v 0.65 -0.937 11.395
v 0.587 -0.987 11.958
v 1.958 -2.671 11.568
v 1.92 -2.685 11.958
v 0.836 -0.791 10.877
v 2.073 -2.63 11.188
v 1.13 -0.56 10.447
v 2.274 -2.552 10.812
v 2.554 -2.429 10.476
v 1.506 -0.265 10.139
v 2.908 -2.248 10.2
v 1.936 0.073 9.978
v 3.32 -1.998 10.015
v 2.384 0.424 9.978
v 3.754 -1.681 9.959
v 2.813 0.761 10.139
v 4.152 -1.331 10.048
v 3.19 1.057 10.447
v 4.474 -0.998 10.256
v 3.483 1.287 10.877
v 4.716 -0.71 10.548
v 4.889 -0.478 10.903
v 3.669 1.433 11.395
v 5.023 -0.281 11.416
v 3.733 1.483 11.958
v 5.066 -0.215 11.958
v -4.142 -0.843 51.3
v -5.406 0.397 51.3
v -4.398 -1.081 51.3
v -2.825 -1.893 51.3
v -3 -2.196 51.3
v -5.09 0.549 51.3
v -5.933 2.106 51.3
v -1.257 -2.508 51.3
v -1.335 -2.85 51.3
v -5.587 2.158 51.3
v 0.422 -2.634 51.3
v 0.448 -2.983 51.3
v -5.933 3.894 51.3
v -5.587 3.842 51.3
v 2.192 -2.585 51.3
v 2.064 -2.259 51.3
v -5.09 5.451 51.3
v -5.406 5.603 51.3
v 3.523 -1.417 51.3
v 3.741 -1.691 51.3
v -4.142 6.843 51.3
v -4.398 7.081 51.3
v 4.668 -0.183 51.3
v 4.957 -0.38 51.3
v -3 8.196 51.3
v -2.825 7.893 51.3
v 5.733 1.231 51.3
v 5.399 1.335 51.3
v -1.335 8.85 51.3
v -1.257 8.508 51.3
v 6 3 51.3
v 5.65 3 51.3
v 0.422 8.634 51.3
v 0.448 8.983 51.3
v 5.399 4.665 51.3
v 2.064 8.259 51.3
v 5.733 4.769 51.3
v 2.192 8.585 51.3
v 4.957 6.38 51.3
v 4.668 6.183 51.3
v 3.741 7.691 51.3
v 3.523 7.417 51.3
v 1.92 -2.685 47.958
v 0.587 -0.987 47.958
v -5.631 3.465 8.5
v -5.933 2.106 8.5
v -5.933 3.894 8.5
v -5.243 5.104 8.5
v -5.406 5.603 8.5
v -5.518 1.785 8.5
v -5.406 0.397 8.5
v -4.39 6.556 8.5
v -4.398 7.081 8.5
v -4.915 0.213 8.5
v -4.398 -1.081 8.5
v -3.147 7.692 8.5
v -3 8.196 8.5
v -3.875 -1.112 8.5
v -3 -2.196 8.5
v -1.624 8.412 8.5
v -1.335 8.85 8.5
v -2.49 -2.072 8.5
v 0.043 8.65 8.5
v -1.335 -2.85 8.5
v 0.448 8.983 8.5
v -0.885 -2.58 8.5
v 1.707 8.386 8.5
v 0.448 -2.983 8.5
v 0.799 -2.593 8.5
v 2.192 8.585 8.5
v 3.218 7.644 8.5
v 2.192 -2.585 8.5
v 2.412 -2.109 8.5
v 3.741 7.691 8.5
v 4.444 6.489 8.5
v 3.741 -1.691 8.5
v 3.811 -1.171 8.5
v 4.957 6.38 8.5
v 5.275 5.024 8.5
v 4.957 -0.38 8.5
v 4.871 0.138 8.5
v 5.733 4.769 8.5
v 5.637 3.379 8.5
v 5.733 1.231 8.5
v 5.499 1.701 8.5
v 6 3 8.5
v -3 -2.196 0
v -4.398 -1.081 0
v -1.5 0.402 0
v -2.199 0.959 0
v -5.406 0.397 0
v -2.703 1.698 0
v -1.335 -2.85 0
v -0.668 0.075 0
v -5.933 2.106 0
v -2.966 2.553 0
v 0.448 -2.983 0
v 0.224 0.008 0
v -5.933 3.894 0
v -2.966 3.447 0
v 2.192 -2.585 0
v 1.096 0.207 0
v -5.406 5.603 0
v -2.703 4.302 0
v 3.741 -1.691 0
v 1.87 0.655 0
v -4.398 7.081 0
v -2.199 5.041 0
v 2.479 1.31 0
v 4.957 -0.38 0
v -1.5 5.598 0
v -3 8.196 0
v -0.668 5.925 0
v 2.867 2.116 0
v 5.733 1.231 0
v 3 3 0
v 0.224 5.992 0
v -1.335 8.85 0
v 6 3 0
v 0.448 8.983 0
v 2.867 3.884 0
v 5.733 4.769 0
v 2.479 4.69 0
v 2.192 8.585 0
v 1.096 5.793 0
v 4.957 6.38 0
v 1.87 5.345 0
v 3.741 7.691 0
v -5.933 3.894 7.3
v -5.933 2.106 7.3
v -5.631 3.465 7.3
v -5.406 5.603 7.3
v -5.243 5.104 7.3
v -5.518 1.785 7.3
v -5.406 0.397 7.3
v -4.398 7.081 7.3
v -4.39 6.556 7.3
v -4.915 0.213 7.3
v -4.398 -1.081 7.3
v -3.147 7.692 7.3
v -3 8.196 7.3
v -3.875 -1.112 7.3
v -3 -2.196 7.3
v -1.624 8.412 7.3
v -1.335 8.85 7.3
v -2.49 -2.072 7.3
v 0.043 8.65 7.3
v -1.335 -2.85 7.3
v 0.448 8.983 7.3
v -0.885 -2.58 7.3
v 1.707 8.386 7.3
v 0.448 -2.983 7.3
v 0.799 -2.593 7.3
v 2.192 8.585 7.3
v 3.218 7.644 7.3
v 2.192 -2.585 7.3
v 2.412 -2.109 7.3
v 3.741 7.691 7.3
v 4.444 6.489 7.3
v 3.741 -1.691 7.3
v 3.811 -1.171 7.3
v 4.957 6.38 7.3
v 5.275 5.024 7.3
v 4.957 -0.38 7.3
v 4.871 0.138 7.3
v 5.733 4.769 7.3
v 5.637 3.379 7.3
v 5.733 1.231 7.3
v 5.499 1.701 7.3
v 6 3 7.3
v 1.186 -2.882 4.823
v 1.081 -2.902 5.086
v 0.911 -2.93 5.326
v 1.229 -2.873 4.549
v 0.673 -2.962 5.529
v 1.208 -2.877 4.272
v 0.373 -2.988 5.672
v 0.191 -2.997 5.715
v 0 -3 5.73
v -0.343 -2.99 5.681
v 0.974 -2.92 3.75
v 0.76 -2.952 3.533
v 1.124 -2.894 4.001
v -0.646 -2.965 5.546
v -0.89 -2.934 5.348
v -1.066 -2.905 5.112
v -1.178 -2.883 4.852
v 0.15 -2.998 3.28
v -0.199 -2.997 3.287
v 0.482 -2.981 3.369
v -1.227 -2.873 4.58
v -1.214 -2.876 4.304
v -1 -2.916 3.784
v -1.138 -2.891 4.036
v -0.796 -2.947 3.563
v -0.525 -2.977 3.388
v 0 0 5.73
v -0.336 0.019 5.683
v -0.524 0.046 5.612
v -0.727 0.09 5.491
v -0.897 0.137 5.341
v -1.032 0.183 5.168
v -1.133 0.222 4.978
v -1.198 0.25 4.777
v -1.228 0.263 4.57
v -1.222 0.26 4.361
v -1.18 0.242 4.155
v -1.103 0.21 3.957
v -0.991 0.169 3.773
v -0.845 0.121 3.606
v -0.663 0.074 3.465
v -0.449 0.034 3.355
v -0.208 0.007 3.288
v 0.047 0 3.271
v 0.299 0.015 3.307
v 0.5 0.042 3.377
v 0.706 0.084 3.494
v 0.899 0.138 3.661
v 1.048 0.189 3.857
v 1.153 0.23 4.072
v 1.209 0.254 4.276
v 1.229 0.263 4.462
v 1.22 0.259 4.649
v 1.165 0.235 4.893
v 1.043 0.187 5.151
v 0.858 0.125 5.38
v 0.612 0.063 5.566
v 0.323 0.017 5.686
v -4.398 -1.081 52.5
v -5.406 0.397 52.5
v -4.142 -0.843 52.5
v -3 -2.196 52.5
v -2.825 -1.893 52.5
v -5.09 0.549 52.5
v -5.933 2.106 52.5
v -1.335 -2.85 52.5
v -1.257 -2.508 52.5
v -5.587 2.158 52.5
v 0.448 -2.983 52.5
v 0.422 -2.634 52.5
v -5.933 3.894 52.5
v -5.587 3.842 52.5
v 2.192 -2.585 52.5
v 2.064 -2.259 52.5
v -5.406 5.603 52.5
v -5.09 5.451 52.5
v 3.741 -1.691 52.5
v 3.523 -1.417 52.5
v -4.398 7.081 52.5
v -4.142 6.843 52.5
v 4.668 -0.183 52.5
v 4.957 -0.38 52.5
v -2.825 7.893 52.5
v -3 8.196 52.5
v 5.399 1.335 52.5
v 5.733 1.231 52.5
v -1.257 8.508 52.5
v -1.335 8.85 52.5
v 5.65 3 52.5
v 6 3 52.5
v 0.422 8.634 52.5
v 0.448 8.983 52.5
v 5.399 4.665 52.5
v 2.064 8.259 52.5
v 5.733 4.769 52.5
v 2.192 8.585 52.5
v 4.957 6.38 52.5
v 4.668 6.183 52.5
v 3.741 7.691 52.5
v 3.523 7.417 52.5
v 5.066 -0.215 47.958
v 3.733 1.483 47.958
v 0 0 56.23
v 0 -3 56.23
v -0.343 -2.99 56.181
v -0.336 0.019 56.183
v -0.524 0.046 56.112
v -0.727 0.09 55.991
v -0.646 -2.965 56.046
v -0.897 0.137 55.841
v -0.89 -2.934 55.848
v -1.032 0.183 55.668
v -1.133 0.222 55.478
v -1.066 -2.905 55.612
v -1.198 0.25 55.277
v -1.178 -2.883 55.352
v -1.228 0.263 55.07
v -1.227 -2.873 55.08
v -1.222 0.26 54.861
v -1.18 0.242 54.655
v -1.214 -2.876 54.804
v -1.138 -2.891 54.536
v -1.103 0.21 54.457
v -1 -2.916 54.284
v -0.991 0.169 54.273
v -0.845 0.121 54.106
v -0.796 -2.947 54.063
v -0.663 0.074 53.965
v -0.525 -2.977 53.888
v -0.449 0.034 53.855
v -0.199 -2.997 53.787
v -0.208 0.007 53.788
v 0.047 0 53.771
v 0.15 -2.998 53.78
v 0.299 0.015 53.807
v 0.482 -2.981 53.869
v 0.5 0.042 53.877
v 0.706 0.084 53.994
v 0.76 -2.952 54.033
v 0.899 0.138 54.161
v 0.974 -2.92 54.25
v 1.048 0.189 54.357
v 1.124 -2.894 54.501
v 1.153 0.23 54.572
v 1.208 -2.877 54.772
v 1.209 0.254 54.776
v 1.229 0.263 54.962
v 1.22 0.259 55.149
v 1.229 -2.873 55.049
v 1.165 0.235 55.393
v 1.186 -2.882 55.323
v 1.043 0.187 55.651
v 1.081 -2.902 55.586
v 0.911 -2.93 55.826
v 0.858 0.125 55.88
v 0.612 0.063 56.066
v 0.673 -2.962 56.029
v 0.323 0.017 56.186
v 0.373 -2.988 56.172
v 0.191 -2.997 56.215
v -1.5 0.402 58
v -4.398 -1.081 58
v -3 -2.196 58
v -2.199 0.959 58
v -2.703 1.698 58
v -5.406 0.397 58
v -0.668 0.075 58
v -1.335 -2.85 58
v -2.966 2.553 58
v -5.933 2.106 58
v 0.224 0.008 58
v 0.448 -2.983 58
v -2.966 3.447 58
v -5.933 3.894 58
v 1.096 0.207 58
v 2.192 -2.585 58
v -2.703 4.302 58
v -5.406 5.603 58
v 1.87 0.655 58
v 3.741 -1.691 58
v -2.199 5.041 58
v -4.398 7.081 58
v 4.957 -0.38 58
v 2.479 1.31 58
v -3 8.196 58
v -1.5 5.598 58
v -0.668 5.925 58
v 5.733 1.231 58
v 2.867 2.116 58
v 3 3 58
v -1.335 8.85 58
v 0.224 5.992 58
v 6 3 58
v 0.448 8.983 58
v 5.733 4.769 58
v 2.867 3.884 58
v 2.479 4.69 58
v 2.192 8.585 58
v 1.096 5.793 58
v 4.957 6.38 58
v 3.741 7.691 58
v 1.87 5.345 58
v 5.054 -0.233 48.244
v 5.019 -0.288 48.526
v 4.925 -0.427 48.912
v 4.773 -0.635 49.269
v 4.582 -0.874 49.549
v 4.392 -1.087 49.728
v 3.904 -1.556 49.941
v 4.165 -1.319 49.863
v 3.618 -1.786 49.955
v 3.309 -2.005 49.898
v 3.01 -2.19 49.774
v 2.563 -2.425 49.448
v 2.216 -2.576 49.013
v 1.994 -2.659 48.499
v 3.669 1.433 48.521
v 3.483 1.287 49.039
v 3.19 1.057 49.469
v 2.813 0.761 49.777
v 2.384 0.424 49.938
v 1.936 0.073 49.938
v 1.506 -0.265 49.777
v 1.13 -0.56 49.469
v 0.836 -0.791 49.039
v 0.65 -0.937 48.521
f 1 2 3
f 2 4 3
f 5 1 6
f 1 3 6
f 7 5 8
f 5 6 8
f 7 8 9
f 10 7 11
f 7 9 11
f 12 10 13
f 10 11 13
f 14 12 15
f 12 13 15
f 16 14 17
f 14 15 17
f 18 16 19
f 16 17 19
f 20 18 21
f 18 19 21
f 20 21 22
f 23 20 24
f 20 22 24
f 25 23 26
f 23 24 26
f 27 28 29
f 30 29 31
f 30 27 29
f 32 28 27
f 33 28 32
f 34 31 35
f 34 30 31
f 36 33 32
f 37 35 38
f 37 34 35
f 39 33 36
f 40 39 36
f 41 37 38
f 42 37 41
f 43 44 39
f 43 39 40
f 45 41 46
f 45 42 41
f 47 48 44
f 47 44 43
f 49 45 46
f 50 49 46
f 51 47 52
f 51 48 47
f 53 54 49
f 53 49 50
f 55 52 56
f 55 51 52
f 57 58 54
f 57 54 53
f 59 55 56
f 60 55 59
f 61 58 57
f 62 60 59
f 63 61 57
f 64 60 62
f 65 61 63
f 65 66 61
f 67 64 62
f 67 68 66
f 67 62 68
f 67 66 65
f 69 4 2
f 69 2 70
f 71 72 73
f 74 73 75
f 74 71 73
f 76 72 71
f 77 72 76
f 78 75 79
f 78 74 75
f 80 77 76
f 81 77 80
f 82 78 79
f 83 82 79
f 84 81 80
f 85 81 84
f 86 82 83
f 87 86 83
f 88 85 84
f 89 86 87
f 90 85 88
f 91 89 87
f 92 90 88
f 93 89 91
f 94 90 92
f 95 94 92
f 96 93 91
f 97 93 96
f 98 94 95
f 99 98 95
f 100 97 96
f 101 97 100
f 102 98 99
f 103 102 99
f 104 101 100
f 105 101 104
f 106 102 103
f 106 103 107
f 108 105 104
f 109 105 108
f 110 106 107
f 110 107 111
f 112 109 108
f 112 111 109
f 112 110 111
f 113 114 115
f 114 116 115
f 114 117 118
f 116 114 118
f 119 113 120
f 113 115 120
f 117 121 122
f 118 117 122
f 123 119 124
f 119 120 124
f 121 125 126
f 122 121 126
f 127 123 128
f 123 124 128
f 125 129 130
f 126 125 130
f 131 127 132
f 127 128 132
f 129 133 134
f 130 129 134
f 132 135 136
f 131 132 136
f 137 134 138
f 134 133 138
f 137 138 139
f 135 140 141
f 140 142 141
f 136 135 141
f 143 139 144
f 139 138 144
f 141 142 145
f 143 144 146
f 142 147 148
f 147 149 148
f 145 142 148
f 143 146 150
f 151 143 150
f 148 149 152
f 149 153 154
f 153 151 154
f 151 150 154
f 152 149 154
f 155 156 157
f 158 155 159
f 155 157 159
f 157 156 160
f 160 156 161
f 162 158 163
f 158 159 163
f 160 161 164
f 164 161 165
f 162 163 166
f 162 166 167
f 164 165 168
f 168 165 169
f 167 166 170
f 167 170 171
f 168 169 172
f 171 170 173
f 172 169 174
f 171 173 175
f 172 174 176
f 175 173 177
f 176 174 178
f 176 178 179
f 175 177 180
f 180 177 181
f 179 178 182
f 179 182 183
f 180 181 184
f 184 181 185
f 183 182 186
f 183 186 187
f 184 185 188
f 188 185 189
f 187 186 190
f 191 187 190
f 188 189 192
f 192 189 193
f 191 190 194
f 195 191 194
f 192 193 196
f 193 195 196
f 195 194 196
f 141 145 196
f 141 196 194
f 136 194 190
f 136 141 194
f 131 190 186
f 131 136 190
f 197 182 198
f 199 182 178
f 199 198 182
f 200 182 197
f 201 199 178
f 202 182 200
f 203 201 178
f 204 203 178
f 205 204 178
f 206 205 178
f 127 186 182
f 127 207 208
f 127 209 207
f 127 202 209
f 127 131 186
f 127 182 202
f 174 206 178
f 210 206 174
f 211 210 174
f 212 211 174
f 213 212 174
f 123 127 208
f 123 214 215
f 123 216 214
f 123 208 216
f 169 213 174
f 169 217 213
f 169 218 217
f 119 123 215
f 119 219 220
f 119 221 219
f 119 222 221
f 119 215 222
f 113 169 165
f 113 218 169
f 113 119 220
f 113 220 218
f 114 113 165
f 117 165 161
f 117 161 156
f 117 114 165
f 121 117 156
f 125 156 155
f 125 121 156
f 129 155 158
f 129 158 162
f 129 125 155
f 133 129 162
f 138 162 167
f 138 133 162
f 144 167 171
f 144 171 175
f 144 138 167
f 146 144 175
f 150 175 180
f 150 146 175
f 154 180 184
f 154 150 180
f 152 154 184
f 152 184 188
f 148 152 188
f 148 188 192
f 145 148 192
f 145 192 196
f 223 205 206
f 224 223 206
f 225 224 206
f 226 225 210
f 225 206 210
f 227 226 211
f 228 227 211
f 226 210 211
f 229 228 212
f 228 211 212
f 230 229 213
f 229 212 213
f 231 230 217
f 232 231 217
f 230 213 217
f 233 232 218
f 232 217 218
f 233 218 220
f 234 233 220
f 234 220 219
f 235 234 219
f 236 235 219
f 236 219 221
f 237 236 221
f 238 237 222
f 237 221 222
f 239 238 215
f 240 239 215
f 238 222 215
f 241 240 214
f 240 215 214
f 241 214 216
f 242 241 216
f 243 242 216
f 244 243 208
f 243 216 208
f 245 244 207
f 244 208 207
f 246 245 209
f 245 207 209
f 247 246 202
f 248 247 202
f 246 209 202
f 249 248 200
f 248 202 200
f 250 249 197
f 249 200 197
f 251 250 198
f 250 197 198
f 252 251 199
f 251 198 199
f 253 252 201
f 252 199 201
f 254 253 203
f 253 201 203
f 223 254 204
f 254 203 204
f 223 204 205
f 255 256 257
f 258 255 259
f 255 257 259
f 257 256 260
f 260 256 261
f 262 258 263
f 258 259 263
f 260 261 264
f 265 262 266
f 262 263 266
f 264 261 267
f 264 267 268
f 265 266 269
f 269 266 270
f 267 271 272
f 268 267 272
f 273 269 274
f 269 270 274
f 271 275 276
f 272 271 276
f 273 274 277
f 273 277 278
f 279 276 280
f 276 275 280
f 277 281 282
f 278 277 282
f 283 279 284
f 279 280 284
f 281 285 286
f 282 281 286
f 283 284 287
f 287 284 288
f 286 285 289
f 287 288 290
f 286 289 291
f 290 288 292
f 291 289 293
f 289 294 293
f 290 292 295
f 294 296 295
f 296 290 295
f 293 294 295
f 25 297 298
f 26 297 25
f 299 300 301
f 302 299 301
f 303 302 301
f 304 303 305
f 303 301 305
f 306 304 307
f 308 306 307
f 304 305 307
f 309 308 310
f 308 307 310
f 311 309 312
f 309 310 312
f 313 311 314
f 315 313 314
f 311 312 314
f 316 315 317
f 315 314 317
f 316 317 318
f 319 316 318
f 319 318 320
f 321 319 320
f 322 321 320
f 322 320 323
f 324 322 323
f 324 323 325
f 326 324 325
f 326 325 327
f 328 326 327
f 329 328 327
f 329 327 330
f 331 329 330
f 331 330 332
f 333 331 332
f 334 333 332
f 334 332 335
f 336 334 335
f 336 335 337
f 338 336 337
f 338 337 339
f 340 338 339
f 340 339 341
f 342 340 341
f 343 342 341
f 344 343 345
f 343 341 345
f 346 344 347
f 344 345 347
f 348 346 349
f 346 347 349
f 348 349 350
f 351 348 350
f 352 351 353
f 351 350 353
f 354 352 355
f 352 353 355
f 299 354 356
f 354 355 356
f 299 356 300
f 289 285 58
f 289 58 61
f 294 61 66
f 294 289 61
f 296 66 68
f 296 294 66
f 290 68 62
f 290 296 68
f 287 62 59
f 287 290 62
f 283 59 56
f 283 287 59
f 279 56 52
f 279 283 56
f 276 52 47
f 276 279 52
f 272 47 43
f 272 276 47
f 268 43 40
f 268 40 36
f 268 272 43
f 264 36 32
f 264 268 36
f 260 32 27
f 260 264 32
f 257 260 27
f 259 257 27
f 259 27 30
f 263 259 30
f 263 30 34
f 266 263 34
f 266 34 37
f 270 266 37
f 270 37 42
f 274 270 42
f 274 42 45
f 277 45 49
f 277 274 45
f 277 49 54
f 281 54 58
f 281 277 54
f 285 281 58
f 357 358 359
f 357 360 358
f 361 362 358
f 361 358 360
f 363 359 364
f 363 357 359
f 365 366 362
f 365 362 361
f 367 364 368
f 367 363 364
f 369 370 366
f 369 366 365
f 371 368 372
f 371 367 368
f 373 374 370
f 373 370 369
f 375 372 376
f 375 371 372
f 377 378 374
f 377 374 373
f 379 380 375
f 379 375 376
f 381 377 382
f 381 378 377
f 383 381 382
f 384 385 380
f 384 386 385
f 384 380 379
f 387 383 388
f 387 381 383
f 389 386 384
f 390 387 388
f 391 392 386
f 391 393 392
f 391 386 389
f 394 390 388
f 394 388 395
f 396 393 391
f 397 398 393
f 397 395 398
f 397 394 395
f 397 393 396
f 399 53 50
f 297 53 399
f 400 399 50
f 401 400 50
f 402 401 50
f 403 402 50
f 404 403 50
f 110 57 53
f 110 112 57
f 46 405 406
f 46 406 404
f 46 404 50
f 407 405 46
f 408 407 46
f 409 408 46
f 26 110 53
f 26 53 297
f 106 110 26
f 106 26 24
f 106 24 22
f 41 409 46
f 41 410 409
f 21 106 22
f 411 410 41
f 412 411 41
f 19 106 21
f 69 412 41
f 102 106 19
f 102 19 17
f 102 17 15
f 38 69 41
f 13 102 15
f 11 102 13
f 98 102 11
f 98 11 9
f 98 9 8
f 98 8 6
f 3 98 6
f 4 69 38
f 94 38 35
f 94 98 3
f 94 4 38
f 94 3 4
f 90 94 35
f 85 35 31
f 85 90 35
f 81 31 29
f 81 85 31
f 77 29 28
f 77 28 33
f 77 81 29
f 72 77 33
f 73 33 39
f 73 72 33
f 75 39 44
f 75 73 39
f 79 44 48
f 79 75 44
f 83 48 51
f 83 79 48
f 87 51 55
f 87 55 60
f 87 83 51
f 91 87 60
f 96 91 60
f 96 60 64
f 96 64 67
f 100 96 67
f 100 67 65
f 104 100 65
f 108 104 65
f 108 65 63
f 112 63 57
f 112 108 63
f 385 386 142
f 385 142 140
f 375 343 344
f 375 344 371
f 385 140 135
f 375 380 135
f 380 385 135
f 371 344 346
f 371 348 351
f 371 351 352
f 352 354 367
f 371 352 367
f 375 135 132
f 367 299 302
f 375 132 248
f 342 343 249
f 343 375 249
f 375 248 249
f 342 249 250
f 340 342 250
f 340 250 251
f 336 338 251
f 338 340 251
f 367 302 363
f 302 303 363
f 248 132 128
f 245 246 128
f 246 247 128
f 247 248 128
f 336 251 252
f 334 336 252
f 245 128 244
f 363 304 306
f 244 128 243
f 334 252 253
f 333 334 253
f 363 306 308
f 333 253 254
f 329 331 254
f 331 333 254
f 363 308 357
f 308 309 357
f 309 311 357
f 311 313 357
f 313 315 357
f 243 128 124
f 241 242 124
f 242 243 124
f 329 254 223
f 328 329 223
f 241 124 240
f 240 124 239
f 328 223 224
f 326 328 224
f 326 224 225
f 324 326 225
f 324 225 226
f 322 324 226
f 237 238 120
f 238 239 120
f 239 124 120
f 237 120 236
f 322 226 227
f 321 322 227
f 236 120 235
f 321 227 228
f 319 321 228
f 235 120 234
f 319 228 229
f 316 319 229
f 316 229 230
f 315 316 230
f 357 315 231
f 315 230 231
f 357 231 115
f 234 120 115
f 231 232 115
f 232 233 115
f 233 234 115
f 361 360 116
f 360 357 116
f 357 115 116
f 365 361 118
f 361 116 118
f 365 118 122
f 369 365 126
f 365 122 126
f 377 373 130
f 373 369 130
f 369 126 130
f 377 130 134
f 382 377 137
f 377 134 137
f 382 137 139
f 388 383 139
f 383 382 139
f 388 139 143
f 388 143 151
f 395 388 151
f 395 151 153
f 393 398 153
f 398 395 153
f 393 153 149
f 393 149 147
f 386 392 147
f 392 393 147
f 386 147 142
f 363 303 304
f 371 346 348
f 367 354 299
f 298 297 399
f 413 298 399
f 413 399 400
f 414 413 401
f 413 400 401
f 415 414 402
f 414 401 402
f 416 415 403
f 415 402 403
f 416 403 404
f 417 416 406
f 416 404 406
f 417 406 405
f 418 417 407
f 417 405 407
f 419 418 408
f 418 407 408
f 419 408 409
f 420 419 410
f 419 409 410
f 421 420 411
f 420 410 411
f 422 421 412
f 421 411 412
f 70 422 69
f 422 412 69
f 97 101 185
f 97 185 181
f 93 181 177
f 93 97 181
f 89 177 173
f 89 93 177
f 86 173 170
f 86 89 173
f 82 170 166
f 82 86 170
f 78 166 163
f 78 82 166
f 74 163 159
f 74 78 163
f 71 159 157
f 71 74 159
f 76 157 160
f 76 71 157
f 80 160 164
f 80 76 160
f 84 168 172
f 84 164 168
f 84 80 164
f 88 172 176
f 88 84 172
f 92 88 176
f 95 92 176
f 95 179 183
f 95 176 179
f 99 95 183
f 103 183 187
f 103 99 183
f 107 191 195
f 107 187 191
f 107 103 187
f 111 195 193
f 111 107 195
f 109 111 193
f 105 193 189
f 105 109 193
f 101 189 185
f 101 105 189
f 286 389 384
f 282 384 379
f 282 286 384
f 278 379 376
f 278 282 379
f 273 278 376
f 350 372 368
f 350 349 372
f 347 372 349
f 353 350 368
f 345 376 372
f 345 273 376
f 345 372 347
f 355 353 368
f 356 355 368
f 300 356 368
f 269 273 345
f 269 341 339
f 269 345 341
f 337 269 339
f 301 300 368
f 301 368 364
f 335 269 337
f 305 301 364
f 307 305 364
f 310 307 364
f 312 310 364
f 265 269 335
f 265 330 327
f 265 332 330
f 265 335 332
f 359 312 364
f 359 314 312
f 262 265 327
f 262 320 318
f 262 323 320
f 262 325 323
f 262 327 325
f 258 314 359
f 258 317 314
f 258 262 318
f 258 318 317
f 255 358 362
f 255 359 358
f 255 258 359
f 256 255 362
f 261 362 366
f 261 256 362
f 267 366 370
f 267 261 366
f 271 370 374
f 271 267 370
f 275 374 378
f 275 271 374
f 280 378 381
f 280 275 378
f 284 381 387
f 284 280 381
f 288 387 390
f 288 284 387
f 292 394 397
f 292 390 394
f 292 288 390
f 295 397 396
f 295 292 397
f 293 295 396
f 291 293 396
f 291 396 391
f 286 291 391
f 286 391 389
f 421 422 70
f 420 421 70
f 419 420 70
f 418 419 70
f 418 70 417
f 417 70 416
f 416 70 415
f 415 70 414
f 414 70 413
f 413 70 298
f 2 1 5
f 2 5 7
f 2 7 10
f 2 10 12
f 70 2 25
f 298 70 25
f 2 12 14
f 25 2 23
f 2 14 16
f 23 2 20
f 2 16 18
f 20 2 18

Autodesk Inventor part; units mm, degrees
ref_plane "YZ Plane" through (0, 0, 0) normal (1, 0, 0) x (0, 1, 0)
ref_plane "XY Plane" through (0, 0, 0) normal (0, 0, 1) x (1, 0, 0)
sketch "Эскиз1" plane through (0, 0, 0) normal (0, 0, 1) x (1, 0, 0)
  circle A0 centre (0, 3) radius 3 projected
  circle A1 centre (0, 3) radius 6
  point P0 (0, 0)
  dimension "d0" = 12
extrude "Выдавливание1" add sketch "Эскиз1" along normal blind 58
sketch "Эскиз2" plane through (0, 0, 0) normal (0, 1, 0) x (-1, 0, 0)
  line L0 (6, 58) -> (-6, 58) projected
  line L1 (0, 58) -> (0, 55) construction
  line L2 (0, 0) -> (0, 4.5)
  dimension "d4" = 3
  dimension "d5" = 4.5
ref_plane "РабПлоскость1" through (0, 2.25, 0) normal (0, 1, 0) x (-1, 0, 0)
sketch "Эскиз3" plane through (0, 2.25, 0) normal (0, 1, 0) x (-1, 0, 0)
  point P0 (0, 0)
  point P1 (0, 55)
  point P2 (0, 4.5)
hole "Отверстие1" at (0, 2.25, 55) at (0, 2.25, 4.5) direction (0, -1, 0) diameter 2.459 depth 8.8 tip angle 118 thread size "M3x0.5" class "6H" standard "ISO Metric profile"
ref_plane "РабПлоскость2" through (0, 3, 52.5) normal (0, 0, 1) x (1, 0, 0)
sketch "Эскиз4" plane through (0, 3, 52.5) normal (0, 0, 1) x (1, 0, 0)
  circle A0 centre (0, 0) radius 5.65
  circle A1 centre (0, 0) radius 6.8955
  point P0 (0, -3)
  dimension "d15" = 11.3
extrude "Выдавливание2" cut sketch "Эскиз4" against normal blind 1.2
ref_plane "РабПлоскость3" through (0, 3, 8.5) normal (0, 0, -1) x (0.7866, 0.6175, 0)
sketch "Эскиз5" plane through (0, 3, 8.5) normal (0, 0, -1) x (0.7866, 0.6175, 0)
  circle A0 centre (0, 0) radius 5.65
  circle A1 centre (0, 0) radius 6.969
  point P0 (-1.8524, 2.3598)
  dimension "d18" = 11.3
extrude "Выдавливание3" cut sketch "Эскиз5" along normal blind 1.2
ref_plane "РабПлоскость4" through (6.468, -1.8388, 51.5) normal (-0.6175, 0.7866, 0) x (0.7866, 0.6175, 0)
sketch "Эскиз6" plane through (6.468, -1.8388, 51.5) normal (-0.6175, 0.7866, 0) x (0.7866, 0.6175, 0)
  line L0 (-8.1, -6.5) -> (3.9, -6.5) projected
  line L1 (-2.1, -6.5) -> (-2.1, 51.5) construction
  line L2 (-8.1, 51.5) -> (3.9, 51.5) projected
  line L3 (-2.1, 3.542) -> (-2.1, 39.542) construction
  line L4 (-0.1, 3.542) -> (-0.1, 39.542)
  line L5 (-4.1, 39.542) -> (-4.1, 3.542)
  arc A0 (-4.1, 3.542) -> (-0.1, 3.542) centre (-2.1, 3.542) ccw
  arc A1 (-0.1, 39.542) -> (-4.1, 39.542) centre (-2.1, 39.542) ccw
  point P0 (-3.9524, 51.5)
  point P1 (-2.1, 21.542)
  dimension "d21" = 36
  dimension "d22" = 4
extrude "Выдавливание4" cut sketch "Эскиз6" along normal blind 4.3
properties part number "Вал 2 оси"
